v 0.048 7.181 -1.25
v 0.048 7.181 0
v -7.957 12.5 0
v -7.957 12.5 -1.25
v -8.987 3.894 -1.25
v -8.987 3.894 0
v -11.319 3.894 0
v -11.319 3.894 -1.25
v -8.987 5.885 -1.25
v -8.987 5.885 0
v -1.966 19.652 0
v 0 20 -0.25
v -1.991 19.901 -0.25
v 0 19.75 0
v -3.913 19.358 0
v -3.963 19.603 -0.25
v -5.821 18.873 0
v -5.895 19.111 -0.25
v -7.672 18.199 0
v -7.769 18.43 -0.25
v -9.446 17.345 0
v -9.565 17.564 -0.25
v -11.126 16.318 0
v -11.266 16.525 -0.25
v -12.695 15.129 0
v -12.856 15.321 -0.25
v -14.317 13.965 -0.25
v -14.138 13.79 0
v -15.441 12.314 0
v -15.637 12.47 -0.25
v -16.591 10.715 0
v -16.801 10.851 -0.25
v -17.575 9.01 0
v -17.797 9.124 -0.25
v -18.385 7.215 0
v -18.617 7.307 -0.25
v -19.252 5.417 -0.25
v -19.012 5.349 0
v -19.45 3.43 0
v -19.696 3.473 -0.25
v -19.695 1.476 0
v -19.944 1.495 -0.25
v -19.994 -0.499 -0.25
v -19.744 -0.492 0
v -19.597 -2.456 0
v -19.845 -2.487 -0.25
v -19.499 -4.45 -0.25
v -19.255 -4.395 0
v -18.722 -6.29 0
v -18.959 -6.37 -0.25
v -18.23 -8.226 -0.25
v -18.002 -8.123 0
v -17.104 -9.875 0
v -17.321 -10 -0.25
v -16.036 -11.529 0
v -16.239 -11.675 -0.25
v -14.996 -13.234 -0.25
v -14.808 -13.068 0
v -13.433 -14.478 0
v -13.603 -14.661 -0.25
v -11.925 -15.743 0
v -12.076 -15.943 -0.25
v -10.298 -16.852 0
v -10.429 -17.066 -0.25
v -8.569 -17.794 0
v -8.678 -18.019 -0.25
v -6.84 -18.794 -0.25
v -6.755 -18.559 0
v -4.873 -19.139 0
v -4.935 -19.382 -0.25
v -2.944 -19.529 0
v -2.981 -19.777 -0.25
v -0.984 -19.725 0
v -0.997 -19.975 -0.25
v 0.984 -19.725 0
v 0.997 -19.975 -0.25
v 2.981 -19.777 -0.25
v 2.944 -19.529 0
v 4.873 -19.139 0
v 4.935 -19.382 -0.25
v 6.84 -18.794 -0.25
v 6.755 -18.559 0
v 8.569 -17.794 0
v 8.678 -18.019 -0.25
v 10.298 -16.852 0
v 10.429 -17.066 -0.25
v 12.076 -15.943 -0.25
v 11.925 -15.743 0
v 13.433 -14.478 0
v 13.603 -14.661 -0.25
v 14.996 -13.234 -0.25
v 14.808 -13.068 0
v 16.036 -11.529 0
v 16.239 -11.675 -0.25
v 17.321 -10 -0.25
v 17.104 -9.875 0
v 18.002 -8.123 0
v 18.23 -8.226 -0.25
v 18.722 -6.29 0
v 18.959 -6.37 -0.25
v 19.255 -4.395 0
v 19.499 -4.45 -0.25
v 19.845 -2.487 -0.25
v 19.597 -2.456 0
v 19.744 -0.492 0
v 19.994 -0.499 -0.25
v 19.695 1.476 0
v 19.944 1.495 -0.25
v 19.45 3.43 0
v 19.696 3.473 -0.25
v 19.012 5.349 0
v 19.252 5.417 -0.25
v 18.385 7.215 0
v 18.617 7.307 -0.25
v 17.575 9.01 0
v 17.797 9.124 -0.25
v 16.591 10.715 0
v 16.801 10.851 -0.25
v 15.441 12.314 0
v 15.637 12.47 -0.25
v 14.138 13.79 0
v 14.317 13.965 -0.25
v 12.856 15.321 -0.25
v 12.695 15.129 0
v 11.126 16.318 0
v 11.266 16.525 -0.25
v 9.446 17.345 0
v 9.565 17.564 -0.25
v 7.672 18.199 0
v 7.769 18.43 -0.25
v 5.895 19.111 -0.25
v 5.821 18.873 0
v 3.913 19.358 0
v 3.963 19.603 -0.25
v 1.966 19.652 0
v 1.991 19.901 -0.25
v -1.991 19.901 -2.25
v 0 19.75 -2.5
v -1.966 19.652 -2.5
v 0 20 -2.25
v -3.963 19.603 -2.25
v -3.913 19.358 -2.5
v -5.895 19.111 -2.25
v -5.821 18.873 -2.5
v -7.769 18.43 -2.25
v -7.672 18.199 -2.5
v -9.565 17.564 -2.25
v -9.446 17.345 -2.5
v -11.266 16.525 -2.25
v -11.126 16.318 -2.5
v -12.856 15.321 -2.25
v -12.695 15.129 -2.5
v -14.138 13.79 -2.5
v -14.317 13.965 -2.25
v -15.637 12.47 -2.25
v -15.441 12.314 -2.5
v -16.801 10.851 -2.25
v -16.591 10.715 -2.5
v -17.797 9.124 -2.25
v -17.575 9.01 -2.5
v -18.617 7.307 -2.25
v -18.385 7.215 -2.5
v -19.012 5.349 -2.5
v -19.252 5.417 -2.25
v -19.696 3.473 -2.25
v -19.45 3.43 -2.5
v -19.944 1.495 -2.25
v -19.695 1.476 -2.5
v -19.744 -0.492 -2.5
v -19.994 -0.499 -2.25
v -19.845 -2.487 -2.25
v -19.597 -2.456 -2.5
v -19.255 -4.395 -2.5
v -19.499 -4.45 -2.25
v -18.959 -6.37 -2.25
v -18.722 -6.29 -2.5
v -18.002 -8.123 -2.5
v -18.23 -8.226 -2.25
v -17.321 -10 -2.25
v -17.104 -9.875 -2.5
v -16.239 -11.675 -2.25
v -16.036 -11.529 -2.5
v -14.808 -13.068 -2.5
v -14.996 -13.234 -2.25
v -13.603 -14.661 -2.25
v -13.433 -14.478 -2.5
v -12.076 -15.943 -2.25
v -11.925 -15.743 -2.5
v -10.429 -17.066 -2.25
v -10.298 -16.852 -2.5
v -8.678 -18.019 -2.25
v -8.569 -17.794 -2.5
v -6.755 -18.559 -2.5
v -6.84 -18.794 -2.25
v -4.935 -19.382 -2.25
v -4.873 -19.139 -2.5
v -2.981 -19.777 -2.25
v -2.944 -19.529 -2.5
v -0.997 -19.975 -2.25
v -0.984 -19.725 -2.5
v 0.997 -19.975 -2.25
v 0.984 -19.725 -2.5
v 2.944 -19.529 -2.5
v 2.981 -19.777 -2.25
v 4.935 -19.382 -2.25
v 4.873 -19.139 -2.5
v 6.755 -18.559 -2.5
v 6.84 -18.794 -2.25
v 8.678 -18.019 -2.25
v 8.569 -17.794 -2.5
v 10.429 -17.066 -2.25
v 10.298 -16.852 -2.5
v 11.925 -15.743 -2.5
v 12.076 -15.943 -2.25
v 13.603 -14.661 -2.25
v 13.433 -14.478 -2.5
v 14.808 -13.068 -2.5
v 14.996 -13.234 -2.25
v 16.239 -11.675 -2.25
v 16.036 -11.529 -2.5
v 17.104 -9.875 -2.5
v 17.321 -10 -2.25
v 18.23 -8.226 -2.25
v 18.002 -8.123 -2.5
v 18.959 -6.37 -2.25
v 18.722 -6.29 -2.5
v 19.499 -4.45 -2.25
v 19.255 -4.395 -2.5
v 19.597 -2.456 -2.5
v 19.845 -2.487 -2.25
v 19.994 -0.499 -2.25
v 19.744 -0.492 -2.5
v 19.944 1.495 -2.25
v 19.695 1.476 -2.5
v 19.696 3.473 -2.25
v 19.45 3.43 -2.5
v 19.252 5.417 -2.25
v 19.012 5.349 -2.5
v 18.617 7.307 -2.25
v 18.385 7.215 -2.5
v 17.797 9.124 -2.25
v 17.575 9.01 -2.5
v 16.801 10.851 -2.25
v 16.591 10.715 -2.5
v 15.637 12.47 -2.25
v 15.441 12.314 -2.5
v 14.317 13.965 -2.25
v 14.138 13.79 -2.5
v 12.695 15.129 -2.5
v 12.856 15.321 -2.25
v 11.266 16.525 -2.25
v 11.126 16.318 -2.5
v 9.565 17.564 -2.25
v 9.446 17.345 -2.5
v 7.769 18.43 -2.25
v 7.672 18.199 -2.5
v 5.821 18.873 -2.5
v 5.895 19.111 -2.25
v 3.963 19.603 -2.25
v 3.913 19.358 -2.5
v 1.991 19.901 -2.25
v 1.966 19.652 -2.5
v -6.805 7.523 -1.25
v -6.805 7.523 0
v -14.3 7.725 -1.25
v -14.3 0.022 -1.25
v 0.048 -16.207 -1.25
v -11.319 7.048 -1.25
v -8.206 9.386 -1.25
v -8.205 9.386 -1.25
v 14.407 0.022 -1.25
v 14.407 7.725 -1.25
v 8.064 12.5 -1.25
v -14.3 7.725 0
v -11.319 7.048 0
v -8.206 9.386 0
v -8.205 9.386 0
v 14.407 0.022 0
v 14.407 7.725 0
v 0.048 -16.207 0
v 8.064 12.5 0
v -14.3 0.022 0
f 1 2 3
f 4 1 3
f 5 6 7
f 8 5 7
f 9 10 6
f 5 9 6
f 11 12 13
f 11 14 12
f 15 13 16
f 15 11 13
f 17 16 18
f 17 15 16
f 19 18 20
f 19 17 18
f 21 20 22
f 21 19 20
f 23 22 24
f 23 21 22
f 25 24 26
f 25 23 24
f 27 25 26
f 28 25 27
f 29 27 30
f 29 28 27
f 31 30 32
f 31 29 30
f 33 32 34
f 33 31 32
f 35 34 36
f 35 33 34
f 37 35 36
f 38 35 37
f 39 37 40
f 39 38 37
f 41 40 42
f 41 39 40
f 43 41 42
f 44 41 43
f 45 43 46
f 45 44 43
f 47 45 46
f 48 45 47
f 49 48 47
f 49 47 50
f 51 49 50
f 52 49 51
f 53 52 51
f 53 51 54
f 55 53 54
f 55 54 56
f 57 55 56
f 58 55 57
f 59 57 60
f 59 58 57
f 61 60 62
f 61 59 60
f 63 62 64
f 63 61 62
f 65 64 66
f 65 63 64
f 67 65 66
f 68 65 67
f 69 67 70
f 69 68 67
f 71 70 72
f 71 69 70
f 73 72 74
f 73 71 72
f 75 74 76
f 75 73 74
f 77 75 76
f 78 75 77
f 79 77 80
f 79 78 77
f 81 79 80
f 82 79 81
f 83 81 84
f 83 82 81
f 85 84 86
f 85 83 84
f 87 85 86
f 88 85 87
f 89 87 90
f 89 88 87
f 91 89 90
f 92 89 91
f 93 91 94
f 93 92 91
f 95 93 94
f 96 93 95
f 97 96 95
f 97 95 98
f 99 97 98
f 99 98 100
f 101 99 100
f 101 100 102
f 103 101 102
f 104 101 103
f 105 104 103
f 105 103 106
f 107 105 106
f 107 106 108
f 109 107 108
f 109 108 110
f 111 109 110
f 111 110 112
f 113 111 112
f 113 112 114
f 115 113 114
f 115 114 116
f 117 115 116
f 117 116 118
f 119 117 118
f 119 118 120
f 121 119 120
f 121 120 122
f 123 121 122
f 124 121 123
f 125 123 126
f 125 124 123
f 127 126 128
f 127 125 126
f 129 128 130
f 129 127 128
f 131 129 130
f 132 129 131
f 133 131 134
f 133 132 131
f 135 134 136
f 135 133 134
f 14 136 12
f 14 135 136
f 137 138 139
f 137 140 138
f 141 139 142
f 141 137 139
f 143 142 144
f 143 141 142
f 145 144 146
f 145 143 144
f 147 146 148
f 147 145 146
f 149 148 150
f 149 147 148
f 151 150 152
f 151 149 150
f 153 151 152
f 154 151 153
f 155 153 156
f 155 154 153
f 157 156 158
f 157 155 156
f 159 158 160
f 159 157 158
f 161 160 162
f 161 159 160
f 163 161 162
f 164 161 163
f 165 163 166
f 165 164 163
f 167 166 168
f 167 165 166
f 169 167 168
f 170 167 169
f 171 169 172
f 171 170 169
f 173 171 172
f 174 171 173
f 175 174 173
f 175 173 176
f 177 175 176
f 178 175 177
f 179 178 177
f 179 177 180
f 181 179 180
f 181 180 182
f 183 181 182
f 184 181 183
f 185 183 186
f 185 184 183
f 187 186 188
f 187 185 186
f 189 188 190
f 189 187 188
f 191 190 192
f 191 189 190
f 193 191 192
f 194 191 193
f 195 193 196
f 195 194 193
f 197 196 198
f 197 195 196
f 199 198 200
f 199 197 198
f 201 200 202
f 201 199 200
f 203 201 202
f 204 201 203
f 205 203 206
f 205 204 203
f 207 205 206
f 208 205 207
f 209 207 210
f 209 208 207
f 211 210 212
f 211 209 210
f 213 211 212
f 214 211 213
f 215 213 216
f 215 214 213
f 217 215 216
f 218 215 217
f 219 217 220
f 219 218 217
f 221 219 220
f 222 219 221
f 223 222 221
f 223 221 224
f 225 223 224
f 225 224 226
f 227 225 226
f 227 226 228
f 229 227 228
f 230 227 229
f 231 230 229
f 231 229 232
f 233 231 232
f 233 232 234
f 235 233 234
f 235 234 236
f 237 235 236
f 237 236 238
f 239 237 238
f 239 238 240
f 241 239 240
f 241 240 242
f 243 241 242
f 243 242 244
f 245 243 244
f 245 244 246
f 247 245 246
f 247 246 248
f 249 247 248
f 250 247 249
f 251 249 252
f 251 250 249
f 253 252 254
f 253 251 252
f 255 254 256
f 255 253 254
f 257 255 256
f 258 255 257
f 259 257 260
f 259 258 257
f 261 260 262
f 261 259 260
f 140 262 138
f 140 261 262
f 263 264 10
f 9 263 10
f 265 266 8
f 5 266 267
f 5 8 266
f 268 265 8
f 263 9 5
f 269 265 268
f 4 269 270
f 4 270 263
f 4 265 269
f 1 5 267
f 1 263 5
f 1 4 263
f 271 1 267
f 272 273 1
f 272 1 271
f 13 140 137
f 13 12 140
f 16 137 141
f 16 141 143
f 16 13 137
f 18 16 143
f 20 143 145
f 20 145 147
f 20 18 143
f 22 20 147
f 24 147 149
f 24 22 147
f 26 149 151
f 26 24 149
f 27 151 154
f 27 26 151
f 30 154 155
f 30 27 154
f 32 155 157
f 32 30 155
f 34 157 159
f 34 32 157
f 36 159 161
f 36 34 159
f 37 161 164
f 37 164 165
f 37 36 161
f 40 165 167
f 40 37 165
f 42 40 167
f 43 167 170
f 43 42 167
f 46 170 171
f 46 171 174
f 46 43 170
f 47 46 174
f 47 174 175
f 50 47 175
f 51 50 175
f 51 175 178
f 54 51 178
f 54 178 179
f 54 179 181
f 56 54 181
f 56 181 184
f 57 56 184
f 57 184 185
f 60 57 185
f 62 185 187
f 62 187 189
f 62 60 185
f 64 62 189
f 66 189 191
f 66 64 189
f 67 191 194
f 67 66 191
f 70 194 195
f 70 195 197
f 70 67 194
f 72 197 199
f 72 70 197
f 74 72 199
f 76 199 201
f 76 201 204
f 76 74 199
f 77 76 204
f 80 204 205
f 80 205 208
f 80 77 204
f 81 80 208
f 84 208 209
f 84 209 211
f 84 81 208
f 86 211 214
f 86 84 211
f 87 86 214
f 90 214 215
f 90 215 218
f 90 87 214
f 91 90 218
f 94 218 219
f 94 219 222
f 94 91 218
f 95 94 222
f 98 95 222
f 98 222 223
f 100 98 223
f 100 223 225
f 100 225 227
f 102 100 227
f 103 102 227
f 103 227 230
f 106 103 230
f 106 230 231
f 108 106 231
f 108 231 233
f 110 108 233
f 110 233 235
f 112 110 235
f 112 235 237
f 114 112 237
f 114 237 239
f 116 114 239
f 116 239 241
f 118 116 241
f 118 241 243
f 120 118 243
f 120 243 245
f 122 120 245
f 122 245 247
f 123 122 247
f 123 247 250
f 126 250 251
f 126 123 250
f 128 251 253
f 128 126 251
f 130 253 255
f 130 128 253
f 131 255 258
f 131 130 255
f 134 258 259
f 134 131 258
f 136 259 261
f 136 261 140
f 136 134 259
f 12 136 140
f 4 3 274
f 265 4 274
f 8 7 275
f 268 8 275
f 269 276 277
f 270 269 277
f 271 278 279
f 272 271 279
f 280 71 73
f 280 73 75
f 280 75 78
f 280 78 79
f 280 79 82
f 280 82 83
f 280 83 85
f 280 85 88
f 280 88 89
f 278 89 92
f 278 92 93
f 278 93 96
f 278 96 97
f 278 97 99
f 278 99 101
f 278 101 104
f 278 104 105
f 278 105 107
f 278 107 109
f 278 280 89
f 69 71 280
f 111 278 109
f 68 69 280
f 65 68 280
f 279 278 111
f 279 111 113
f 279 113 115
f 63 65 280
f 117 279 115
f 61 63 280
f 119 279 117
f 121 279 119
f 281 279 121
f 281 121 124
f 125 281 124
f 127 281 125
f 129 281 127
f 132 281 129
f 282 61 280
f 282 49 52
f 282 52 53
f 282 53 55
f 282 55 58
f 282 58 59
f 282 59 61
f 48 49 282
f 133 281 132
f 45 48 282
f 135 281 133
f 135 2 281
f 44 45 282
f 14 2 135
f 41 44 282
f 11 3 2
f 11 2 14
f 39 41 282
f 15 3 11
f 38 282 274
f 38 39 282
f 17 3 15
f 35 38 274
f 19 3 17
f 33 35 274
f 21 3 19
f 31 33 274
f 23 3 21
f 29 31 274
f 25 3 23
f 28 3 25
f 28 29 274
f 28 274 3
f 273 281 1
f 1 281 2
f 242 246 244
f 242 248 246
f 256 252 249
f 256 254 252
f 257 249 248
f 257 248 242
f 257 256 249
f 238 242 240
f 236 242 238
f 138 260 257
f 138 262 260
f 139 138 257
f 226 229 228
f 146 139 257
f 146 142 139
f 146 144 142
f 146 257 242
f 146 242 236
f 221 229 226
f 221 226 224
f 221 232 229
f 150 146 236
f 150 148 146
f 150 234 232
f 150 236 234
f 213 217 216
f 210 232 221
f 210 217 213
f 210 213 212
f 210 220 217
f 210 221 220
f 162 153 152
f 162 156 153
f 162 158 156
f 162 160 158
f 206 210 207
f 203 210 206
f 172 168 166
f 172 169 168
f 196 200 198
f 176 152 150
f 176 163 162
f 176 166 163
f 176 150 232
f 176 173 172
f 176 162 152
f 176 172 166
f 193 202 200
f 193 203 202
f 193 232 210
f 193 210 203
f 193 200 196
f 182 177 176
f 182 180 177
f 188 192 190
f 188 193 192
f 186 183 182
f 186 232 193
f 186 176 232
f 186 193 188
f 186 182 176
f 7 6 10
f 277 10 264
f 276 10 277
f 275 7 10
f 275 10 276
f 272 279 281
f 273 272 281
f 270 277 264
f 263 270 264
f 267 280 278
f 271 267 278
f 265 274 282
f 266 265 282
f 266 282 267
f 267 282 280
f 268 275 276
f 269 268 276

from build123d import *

# Parameters (mm, degrees)
POCKET_DEPTH = 1.25


with BuildPart() as part:
    # Sketch (on DatumPlane) → Revolution (revolve)
    with BuildSketch(Plane.YZ):
        Polygon((0, 0), (0, -2.5), (19.75, -2.5), (20, -2.25), (20, -0.25), (19.75, 0), align=None)
    revolve(axis=Axis((0, 0, 0), (0, 0, 1)))

    # Sketch005 → Pocket (cut)
    with BuildSketch(Plane.XY):
        with BuildLine():
            add(Edge.make_bspline(
                [(-7.956615, 12.5), (-14.3, 7.725144)],
                knots=[0, 0, 42.868665, 42.868665], degree=1))
            add(Edge.make_bspline(
                [(-14.3, 7.725144), (-14.3, 0.021589)],
                knots=[0, 0, 41.594, 41.594], degree=1))
            add(Edge.make_bspline(
                [(-14.3, 0.021589), (0.047904, -16.207292)],
                knots=[0, 0, 116.959765, 116.959765], degree=1))
            add(Edge.make_bspline(
                [(0.047904, -16.207292), (14.407292, 0.021589)],
                knots=[0, 0, 117.00084, 117.00084], degree=1))
            add(Edge.make_bspline(
                [(14.407292, 0.021589), (14.407292, 7.725144)],
                knots=[0, 0, 41.594, 41.594], degree=1))
            add(Edge.make_bspline(
                [(14.407292, 7.725144), (8.063906, 12.5)],
                knots=[0, 0, 42.868665, 42.868665], degree=1))
            add(Edge.make_bspline(
                [(8.063906, 12.5), (0.047904, 7.181002)],
                knots=[0, 0, 51.942525, 51.942525], degree=1))
            add(Edge.make_bspline(
                [(0.047904, 7.181002), (-7.956615, 12.5)],
                knots=[0, 0, 51.890875, 51.890875], degree=1))
        make_face()
        with BuildLine():
            add(Edge.make_bspline(
                [(-8.205498, 9.386277), (-6.80486, 7.522711)],
                knots=[0, 0, 12.587107, 12.587107], degree=1))
            add(Edge.make_bspline(
                [(-6.80486, 7.522711), (-8.986799, 5.884766)],
                knots=[0, 0, 14.731081, 14.731081], degree=1))
            add(Edge.make_bspline(
                [(-8.986799, 5.884766), (-8.986799, 3.893776)],
                knots=[0, 0, 10.75, 10.75], degree=1))
            add(Edge.make_bspline(
                [(-8.986799, 3.893776), (-11.319313, 3.893776)],
                knots=[0, 0, 12.594, 12.594], degree=1))
            add(Edge.make_bspline(
                [(-11.319313, 3.893776), (-11.319313, 7.048059)],
                knots=[0, 0, 17.031, 17.031], degree=1))
            add(Edge.make_bspline(
                [(-11.319313, 7.048059), (-8.20559, 9.386315)],
                knots=[0, 0, 21.024604, 21.024604], degree=1))
            add(Edge.make_bspline(
                [(-8.20559, 9.386315), (-8.205498, 9.386277)],
                knots=[0, 0, 0.000539, 0.000539], degree=1))
        make_face(mode=Mode.SUBTRACT)
    extrude(amount=-POCKET_DEPTH, mode=Mode.SUBTRACT)


solid = part.part
